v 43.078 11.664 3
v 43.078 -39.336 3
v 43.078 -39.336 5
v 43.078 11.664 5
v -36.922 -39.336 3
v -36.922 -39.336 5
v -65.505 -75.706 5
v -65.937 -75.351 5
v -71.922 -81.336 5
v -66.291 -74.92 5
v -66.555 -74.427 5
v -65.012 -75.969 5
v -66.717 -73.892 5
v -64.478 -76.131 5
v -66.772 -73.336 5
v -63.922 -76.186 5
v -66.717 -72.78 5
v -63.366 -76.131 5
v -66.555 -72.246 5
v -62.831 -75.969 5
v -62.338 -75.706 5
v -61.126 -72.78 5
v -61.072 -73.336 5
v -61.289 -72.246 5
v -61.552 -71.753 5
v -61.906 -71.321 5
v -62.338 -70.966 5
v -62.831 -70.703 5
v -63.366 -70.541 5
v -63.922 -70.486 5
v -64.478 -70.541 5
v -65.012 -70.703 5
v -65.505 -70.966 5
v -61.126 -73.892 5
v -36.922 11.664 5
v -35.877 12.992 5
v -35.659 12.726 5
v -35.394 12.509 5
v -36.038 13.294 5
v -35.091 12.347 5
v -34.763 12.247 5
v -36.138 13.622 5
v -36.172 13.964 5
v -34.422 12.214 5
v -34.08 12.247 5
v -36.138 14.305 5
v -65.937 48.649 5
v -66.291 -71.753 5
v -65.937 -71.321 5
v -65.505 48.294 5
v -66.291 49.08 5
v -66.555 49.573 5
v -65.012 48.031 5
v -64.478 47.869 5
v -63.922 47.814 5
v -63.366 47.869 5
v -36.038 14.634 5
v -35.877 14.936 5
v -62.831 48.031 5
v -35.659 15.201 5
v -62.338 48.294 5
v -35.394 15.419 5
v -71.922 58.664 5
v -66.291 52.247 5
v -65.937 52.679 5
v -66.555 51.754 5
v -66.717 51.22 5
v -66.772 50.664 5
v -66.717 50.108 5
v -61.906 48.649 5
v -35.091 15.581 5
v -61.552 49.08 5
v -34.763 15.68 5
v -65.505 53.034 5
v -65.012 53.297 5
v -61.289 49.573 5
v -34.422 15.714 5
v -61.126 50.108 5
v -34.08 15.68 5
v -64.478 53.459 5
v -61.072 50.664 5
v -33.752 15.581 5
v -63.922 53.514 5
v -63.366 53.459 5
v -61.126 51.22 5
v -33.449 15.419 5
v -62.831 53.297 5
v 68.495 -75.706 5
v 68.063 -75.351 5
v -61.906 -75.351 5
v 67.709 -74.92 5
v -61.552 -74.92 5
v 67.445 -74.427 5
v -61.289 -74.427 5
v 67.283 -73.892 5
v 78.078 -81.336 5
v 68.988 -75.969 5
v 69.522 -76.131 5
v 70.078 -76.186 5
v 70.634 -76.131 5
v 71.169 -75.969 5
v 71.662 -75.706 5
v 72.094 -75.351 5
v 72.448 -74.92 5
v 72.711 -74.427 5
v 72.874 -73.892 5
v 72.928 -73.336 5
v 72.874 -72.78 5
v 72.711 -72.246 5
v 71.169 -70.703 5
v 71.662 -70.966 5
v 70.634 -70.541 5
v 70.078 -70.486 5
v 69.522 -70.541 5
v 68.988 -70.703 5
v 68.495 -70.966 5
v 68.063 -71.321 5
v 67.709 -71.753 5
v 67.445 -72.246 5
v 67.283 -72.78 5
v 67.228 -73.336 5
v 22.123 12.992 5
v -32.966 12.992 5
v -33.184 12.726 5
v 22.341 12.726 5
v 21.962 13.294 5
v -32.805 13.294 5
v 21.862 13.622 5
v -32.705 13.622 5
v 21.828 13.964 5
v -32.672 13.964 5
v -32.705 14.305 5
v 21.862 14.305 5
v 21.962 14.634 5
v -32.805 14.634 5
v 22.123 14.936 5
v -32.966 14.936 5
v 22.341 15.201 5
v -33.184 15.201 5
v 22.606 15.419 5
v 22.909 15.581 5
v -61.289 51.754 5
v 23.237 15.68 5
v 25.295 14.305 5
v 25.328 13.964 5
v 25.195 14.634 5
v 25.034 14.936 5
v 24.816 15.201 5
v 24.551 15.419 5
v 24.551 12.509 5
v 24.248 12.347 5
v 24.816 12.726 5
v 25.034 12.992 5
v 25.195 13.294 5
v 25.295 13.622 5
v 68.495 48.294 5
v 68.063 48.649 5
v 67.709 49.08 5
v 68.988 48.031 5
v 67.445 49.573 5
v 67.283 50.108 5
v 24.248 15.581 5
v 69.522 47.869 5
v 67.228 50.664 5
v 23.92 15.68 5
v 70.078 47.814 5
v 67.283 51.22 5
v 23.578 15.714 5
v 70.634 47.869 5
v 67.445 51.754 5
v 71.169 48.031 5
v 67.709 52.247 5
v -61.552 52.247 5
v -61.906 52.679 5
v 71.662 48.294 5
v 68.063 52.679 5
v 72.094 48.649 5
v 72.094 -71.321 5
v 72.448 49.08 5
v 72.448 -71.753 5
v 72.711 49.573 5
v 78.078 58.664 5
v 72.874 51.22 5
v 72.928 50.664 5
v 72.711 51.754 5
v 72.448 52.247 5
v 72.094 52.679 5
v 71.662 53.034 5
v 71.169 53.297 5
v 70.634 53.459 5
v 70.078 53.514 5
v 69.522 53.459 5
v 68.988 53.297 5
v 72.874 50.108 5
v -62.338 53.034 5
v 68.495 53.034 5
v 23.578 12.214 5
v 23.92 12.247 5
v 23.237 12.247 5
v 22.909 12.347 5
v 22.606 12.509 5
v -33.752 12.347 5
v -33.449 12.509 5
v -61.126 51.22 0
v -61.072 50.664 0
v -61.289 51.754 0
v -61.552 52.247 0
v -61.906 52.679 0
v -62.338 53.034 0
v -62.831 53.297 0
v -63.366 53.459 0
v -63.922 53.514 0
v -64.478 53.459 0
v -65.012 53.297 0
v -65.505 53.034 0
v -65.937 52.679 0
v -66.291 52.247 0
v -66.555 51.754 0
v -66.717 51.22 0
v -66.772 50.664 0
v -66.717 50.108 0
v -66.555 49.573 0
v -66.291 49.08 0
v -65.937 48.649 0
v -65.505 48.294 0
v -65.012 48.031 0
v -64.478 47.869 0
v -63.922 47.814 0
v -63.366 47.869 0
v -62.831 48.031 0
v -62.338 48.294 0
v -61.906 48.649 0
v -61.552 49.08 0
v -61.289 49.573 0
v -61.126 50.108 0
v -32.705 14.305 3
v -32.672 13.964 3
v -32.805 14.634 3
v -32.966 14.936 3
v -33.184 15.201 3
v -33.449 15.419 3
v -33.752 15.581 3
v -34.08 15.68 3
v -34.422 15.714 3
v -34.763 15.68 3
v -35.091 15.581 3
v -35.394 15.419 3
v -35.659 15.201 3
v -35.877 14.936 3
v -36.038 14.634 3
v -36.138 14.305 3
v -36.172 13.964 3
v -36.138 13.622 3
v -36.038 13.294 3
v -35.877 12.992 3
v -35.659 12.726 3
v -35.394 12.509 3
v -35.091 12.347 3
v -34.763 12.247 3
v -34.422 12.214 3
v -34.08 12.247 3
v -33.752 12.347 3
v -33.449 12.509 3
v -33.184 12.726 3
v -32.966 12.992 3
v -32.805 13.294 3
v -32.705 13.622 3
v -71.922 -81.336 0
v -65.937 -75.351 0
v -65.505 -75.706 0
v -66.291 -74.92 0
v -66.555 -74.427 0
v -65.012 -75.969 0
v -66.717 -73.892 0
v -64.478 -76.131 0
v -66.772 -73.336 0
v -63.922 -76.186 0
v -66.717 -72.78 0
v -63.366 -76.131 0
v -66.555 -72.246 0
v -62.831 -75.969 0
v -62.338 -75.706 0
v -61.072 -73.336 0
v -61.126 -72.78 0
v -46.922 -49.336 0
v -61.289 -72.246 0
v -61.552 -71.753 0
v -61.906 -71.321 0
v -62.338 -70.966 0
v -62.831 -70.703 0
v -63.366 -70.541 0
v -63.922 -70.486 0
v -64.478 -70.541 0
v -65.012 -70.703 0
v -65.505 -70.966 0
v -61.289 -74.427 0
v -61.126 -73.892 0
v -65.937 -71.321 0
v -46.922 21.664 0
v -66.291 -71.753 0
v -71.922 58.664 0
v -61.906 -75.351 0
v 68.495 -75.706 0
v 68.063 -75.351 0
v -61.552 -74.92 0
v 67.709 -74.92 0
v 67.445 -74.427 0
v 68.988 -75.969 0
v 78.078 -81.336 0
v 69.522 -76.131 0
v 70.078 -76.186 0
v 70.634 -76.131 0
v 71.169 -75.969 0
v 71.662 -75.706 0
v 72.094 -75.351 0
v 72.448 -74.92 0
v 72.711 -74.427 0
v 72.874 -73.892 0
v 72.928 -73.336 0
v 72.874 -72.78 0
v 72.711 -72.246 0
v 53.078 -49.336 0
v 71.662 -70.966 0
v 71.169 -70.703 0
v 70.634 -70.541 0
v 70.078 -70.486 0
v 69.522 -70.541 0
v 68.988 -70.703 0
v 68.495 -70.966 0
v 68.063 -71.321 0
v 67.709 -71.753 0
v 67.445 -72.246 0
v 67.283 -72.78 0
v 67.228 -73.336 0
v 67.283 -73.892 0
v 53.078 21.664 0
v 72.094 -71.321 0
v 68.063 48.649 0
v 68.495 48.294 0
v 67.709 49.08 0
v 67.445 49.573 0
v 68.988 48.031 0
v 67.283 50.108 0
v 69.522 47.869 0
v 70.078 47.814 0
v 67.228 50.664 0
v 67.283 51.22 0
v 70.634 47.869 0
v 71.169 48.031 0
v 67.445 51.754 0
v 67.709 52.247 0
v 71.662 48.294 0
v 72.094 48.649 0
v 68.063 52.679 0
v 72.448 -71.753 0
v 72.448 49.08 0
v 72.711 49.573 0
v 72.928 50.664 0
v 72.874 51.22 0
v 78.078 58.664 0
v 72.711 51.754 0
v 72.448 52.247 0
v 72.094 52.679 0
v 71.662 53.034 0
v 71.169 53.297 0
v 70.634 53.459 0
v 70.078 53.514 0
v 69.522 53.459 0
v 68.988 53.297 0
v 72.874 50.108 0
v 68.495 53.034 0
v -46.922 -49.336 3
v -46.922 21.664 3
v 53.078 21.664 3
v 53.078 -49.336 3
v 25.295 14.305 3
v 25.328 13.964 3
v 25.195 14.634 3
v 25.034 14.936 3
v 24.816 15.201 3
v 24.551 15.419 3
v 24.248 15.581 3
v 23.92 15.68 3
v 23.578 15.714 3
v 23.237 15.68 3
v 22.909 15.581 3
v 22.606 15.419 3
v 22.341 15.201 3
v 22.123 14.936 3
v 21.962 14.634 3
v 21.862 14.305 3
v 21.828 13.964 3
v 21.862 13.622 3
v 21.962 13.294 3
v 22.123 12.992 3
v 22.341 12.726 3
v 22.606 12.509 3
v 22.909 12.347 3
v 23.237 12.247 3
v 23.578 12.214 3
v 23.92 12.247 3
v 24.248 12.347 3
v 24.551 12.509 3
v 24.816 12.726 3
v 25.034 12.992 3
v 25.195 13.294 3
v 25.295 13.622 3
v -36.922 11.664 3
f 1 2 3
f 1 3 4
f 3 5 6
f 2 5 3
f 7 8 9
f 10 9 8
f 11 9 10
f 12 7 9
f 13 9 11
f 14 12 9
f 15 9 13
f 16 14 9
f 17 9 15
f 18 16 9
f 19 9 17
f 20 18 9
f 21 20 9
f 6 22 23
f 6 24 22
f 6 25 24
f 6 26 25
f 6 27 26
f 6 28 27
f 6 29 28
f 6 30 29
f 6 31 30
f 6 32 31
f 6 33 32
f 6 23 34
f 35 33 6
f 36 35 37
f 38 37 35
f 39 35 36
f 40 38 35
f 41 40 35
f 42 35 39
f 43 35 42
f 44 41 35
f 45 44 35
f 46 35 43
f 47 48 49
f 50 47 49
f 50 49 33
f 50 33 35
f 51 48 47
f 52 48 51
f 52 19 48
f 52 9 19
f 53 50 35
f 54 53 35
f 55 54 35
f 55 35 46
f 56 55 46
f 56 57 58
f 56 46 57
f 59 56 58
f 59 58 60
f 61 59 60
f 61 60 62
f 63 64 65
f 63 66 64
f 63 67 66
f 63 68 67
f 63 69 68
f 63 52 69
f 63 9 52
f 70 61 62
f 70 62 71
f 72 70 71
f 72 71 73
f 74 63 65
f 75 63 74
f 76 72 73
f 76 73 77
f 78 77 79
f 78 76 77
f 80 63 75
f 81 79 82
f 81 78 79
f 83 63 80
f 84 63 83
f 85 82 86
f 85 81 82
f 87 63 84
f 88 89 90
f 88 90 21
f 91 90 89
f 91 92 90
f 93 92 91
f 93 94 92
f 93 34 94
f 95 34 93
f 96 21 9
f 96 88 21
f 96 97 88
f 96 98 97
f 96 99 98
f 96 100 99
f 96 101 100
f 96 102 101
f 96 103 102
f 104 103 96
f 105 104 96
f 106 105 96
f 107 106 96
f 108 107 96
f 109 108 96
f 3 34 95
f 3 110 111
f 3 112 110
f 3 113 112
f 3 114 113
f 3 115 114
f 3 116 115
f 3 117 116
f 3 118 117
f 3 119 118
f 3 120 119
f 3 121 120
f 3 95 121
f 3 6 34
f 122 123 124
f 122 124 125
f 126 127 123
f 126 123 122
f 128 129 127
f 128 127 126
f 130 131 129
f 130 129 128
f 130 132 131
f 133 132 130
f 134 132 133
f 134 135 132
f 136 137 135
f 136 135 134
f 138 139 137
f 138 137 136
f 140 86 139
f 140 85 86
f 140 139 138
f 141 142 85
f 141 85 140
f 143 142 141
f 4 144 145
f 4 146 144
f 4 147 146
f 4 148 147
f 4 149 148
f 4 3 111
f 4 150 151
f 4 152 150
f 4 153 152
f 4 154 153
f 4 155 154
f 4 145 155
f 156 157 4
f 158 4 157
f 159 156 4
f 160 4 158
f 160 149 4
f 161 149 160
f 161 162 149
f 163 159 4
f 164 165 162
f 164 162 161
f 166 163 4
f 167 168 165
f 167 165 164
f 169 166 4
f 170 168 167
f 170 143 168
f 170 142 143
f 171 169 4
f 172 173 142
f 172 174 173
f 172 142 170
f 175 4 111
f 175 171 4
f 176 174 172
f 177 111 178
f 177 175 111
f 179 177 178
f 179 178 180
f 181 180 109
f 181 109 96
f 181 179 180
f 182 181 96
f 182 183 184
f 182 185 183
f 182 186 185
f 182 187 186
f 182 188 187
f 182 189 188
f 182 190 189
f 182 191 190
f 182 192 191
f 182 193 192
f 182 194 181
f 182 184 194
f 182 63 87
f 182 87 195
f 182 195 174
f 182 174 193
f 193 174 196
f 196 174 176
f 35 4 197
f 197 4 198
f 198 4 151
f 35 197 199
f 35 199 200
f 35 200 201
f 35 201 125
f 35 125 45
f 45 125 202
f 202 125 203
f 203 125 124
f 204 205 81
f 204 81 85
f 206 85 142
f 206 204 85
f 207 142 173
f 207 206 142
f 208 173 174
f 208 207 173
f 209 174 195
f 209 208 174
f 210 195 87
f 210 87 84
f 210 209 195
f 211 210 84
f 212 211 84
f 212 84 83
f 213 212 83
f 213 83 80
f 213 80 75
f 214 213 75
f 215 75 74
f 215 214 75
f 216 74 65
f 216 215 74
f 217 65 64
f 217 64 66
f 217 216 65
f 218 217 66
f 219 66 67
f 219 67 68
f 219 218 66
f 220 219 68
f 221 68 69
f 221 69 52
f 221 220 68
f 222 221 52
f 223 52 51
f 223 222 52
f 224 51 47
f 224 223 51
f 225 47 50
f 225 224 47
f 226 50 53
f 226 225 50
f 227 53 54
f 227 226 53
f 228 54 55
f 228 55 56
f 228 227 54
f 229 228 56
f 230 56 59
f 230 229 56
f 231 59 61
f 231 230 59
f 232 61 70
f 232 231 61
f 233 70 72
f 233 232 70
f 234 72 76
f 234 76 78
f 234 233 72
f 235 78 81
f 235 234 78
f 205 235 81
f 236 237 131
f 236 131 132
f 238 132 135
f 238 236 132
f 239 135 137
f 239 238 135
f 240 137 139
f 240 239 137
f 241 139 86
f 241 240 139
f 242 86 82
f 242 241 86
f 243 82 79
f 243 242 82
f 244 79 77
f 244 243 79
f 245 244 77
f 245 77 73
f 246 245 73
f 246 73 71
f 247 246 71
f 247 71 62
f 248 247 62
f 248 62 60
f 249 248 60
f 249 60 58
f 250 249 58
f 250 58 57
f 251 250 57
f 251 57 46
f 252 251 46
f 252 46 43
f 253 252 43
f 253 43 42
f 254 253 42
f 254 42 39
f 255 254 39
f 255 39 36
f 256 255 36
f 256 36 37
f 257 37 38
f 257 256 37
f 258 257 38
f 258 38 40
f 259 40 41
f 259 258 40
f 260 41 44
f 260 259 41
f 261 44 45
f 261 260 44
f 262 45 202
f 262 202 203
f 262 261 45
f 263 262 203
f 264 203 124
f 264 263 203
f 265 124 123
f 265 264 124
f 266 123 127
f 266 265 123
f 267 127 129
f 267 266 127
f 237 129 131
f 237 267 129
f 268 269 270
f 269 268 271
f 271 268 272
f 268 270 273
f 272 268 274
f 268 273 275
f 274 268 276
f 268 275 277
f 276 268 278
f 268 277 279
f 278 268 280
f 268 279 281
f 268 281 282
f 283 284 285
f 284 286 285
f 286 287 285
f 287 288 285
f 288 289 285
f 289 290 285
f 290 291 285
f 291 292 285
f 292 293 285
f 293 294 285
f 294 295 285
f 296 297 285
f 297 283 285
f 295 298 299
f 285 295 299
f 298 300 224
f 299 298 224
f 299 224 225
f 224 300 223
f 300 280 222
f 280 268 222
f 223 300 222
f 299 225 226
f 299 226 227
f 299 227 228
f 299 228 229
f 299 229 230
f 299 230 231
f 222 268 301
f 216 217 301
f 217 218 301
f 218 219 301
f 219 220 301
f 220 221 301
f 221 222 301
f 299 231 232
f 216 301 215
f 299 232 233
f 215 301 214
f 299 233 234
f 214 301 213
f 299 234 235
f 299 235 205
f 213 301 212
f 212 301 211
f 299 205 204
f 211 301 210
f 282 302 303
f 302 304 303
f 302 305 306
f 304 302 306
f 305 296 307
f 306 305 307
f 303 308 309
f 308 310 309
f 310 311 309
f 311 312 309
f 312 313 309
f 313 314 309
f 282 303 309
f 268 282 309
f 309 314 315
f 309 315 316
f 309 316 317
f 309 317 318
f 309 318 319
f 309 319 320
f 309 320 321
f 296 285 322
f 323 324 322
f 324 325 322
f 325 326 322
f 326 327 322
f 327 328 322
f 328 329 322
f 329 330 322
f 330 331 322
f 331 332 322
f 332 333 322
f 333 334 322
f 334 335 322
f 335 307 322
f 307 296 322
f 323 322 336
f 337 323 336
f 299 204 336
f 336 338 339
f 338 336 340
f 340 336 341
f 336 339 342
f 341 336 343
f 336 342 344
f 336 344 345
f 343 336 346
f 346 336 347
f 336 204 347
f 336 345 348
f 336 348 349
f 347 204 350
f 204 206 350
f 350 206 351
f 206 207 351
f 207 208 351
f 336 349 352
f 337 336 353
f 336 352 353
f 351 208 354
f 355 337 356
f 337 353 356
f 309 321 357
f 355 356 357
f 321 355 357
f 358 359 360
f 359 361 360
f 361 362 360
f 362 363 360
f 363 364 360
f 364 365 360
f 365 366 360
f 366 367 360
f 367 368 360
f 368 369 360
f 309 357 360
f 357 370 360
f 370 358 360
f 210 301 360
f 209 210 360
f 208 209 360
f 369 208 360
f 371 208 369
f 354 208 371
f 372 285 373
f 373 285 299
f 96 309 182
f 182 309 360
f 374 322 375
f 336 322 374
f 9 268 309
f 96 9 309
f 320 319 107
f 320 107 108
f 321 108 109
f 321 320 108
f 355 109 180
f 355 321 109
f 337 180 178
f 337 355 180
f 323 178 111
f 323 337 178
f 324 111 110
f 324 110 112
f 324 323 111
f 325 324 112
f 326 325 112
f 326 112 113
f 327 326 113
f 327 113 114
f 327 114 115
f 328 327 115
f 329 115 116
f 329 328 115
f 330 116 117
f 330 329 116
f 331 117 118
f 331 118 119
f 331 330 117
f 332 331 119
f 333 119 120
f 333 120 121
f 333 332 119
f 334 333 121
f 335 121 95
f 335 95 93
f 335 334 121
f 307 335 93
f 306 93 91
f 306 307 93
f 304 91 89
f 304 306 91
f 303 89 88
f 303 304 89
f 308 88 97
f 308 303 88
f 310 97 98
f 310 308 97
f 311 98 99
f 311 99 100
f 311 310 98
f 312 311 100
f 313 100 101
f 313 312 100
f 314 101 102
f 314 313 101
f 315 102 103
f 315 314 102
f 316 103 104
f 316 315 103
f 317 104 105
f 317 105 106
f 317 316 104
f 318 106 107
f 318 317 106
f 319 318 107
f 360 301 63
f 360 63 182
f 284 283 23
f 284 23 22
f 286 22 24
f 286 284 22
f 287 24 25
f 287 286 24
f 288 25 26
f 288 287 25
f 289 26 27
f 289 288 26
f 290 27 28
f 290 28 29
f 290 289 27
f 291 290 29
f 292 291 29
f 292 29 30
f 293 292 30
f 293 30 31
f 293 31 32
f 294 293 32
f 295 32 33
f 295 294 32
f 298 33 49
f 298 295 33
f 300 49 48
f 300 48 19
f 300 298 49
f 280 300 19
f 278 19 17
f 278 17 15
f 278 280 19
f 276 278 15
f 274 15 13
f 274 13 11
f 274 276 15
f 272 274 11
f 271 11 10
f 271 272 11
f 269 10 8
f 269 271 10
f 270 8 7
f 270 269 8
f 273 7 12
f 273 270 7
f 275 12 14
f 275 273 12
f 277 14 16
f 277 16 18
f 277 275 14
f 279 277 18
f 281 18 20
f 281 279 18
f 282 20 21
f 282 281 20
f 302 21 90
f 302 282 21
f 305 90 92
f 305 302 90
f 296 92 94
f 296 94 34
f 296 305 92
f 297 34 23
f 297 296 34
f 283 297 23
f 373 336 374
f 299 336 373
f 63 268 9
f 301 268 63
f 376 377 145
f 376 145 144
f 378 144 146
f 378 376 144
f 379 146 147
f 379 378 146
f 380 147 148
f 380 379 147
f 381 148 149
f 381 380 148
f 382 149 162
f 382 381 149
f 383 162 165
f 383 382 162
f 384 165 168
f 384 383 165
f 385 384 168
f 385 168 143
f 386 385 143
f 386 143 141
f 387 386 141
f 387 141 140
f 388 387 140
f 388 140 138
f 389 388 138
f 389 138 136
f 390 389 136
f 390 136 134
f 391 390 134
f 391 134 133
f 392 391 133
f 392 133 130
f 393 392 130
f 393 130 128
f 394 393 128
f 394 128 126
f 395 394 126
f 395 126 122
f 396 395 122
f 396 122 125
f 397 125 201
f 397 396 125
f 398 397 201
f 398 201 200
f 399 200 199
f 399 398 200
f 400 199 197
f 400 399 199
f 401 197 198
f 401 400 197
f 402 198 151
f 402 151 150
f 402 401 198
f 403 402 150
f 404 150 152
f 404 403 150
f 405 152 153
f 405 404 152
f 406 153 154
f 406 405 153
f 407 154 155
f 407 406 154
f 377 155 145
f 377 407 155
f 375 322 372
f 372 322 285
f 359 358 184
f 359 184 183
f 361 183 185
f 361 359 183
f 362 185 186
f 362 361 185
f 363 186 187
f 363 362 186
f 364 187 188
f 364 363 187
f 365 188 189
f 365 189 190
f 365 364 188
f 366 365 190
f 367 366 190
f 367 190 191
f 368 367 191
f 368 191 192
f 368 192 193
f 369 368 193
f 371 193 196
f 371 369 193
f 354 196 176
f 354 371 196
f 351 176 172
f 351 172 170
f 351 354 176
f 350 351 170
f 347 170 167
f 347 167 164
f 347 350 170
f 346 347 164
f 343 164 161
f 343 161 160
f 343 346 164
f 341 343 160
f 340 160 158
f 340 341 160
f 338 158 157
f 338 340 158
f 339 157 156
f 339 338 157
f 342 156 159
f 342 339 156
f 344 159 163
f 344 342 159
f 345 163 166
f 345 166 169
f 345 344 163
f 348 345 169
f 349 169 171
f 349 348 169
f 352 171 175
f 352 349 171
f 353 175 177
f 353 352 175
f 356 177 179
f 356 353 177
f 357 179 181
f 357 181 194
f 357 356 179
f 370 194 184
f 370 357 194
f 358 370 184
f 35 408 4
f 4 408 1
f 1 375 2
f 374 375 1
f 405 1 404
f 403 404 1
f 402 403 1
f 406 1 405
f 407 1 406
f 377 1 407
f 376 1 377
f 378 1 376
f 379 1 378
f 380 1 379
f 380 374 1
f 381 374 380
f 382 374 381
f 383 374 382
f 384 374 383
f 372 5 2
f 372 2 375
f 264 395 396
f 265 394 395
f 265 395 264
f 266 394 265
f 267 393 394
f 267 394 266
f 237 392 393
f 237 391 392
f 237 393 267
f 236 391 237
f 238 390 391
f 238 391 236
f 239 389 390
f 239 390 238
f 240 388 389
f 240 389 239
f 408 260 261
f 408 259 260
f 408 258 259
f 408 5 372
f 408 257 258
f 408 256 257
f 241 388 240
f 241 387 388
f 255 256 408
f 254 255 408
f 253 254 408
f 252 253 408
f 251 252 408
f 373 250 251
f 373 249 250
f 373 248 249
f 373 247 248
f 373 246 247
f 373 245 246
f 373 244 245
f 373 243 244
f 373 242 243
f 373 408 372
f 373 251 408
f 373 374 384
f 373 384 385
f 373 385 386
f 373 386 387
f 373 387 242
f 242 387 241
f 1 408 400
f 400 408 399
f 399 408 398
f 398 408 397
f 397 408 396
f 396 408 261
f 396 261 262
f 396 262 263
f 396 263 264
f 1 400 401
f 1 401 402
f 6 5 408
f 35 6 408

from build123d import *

# Parameters (mm, degrees)
SKETCH1_W           = 150
SKETCH1_H           = 140
SKETCH1_R           = 2.85
SKETCH1_R_2         = 1.75
SKETCH1_W_2         = 80
SKETCH1_H_2         = 51
BOSS_EXTRUDE1_DEPTH = 5
SKETCH2_W           = 100
SKETCH2_H           = 71
SKETCH2_W_2         = 80
SKETCH2_H_2         = 51
CUT_EXTRUDE1_DEPTH  = 3


with BuildPart() as part:
    # Sketch1 → Boss-Extrude1 (new body)
    with BuildSketch(Plane.XY):
        with Locations((3.078431373, -11.336177597)):
            Rectangle(SKETCH1_W, SKETCH1_H)
        with Locations((70.078431373, -73.336177597)):
            Circle(SKETCH1_R, mode=Mode.SUBTRACT)
        with Locations((-63.921568627, -73.336177597)):
            Circle(SKETCH1_R, mode=Mode.SUBTRACT)
        with Locations((-63.921568627, 50.663822403)):
            Circle(SKETCH1_R, mode=Mode.SUBTRACT)
        with Locations((70.078431373, 50.663822403)):
            Circle(SKETCH1_R, mode=Mode.SUBTRACT)
        with Locations((-34.421568627, 13.963822403)):
            Circle(SKETCH1_R_2, mode=Mode.SUBTRACT)
        with Locations((23.578431373, 13.963822403)):
            Circle(SKETCH1_R_2, mode=Mode.SUBTRACT)
        with Locations((3.078431373, -13.836177597)):
            Rectangle(SKETCH1_W_2, SKETCH1_H_2, mode=Mode.SUBTRACT)
    extrude(amount=BOSS_EXTRUDE1_DEPTH)

    # Sketch2 → Cut-Extrude1 (cut)
    with BuildSketch(Plane(origin=(0, 0, 0), x_dir=(-1, 0, 0), z_dir=(0, 0, -1))):
        with Locations((-3.078431373, -13.836177597)):
            Rectangle(SKETCH2_W, SKETCH2_H)
        with Locations((-3.078431373, -13.836177597)):
            Rectangle(SKETCH2_W_2, SKETCH2_H_2, mode=Mode.SUBTRACT)
    extrude(amount=-CUT_EXTRUDE1_DEPTH, mode=Mode.SUBTRACT)


solid = part.part
